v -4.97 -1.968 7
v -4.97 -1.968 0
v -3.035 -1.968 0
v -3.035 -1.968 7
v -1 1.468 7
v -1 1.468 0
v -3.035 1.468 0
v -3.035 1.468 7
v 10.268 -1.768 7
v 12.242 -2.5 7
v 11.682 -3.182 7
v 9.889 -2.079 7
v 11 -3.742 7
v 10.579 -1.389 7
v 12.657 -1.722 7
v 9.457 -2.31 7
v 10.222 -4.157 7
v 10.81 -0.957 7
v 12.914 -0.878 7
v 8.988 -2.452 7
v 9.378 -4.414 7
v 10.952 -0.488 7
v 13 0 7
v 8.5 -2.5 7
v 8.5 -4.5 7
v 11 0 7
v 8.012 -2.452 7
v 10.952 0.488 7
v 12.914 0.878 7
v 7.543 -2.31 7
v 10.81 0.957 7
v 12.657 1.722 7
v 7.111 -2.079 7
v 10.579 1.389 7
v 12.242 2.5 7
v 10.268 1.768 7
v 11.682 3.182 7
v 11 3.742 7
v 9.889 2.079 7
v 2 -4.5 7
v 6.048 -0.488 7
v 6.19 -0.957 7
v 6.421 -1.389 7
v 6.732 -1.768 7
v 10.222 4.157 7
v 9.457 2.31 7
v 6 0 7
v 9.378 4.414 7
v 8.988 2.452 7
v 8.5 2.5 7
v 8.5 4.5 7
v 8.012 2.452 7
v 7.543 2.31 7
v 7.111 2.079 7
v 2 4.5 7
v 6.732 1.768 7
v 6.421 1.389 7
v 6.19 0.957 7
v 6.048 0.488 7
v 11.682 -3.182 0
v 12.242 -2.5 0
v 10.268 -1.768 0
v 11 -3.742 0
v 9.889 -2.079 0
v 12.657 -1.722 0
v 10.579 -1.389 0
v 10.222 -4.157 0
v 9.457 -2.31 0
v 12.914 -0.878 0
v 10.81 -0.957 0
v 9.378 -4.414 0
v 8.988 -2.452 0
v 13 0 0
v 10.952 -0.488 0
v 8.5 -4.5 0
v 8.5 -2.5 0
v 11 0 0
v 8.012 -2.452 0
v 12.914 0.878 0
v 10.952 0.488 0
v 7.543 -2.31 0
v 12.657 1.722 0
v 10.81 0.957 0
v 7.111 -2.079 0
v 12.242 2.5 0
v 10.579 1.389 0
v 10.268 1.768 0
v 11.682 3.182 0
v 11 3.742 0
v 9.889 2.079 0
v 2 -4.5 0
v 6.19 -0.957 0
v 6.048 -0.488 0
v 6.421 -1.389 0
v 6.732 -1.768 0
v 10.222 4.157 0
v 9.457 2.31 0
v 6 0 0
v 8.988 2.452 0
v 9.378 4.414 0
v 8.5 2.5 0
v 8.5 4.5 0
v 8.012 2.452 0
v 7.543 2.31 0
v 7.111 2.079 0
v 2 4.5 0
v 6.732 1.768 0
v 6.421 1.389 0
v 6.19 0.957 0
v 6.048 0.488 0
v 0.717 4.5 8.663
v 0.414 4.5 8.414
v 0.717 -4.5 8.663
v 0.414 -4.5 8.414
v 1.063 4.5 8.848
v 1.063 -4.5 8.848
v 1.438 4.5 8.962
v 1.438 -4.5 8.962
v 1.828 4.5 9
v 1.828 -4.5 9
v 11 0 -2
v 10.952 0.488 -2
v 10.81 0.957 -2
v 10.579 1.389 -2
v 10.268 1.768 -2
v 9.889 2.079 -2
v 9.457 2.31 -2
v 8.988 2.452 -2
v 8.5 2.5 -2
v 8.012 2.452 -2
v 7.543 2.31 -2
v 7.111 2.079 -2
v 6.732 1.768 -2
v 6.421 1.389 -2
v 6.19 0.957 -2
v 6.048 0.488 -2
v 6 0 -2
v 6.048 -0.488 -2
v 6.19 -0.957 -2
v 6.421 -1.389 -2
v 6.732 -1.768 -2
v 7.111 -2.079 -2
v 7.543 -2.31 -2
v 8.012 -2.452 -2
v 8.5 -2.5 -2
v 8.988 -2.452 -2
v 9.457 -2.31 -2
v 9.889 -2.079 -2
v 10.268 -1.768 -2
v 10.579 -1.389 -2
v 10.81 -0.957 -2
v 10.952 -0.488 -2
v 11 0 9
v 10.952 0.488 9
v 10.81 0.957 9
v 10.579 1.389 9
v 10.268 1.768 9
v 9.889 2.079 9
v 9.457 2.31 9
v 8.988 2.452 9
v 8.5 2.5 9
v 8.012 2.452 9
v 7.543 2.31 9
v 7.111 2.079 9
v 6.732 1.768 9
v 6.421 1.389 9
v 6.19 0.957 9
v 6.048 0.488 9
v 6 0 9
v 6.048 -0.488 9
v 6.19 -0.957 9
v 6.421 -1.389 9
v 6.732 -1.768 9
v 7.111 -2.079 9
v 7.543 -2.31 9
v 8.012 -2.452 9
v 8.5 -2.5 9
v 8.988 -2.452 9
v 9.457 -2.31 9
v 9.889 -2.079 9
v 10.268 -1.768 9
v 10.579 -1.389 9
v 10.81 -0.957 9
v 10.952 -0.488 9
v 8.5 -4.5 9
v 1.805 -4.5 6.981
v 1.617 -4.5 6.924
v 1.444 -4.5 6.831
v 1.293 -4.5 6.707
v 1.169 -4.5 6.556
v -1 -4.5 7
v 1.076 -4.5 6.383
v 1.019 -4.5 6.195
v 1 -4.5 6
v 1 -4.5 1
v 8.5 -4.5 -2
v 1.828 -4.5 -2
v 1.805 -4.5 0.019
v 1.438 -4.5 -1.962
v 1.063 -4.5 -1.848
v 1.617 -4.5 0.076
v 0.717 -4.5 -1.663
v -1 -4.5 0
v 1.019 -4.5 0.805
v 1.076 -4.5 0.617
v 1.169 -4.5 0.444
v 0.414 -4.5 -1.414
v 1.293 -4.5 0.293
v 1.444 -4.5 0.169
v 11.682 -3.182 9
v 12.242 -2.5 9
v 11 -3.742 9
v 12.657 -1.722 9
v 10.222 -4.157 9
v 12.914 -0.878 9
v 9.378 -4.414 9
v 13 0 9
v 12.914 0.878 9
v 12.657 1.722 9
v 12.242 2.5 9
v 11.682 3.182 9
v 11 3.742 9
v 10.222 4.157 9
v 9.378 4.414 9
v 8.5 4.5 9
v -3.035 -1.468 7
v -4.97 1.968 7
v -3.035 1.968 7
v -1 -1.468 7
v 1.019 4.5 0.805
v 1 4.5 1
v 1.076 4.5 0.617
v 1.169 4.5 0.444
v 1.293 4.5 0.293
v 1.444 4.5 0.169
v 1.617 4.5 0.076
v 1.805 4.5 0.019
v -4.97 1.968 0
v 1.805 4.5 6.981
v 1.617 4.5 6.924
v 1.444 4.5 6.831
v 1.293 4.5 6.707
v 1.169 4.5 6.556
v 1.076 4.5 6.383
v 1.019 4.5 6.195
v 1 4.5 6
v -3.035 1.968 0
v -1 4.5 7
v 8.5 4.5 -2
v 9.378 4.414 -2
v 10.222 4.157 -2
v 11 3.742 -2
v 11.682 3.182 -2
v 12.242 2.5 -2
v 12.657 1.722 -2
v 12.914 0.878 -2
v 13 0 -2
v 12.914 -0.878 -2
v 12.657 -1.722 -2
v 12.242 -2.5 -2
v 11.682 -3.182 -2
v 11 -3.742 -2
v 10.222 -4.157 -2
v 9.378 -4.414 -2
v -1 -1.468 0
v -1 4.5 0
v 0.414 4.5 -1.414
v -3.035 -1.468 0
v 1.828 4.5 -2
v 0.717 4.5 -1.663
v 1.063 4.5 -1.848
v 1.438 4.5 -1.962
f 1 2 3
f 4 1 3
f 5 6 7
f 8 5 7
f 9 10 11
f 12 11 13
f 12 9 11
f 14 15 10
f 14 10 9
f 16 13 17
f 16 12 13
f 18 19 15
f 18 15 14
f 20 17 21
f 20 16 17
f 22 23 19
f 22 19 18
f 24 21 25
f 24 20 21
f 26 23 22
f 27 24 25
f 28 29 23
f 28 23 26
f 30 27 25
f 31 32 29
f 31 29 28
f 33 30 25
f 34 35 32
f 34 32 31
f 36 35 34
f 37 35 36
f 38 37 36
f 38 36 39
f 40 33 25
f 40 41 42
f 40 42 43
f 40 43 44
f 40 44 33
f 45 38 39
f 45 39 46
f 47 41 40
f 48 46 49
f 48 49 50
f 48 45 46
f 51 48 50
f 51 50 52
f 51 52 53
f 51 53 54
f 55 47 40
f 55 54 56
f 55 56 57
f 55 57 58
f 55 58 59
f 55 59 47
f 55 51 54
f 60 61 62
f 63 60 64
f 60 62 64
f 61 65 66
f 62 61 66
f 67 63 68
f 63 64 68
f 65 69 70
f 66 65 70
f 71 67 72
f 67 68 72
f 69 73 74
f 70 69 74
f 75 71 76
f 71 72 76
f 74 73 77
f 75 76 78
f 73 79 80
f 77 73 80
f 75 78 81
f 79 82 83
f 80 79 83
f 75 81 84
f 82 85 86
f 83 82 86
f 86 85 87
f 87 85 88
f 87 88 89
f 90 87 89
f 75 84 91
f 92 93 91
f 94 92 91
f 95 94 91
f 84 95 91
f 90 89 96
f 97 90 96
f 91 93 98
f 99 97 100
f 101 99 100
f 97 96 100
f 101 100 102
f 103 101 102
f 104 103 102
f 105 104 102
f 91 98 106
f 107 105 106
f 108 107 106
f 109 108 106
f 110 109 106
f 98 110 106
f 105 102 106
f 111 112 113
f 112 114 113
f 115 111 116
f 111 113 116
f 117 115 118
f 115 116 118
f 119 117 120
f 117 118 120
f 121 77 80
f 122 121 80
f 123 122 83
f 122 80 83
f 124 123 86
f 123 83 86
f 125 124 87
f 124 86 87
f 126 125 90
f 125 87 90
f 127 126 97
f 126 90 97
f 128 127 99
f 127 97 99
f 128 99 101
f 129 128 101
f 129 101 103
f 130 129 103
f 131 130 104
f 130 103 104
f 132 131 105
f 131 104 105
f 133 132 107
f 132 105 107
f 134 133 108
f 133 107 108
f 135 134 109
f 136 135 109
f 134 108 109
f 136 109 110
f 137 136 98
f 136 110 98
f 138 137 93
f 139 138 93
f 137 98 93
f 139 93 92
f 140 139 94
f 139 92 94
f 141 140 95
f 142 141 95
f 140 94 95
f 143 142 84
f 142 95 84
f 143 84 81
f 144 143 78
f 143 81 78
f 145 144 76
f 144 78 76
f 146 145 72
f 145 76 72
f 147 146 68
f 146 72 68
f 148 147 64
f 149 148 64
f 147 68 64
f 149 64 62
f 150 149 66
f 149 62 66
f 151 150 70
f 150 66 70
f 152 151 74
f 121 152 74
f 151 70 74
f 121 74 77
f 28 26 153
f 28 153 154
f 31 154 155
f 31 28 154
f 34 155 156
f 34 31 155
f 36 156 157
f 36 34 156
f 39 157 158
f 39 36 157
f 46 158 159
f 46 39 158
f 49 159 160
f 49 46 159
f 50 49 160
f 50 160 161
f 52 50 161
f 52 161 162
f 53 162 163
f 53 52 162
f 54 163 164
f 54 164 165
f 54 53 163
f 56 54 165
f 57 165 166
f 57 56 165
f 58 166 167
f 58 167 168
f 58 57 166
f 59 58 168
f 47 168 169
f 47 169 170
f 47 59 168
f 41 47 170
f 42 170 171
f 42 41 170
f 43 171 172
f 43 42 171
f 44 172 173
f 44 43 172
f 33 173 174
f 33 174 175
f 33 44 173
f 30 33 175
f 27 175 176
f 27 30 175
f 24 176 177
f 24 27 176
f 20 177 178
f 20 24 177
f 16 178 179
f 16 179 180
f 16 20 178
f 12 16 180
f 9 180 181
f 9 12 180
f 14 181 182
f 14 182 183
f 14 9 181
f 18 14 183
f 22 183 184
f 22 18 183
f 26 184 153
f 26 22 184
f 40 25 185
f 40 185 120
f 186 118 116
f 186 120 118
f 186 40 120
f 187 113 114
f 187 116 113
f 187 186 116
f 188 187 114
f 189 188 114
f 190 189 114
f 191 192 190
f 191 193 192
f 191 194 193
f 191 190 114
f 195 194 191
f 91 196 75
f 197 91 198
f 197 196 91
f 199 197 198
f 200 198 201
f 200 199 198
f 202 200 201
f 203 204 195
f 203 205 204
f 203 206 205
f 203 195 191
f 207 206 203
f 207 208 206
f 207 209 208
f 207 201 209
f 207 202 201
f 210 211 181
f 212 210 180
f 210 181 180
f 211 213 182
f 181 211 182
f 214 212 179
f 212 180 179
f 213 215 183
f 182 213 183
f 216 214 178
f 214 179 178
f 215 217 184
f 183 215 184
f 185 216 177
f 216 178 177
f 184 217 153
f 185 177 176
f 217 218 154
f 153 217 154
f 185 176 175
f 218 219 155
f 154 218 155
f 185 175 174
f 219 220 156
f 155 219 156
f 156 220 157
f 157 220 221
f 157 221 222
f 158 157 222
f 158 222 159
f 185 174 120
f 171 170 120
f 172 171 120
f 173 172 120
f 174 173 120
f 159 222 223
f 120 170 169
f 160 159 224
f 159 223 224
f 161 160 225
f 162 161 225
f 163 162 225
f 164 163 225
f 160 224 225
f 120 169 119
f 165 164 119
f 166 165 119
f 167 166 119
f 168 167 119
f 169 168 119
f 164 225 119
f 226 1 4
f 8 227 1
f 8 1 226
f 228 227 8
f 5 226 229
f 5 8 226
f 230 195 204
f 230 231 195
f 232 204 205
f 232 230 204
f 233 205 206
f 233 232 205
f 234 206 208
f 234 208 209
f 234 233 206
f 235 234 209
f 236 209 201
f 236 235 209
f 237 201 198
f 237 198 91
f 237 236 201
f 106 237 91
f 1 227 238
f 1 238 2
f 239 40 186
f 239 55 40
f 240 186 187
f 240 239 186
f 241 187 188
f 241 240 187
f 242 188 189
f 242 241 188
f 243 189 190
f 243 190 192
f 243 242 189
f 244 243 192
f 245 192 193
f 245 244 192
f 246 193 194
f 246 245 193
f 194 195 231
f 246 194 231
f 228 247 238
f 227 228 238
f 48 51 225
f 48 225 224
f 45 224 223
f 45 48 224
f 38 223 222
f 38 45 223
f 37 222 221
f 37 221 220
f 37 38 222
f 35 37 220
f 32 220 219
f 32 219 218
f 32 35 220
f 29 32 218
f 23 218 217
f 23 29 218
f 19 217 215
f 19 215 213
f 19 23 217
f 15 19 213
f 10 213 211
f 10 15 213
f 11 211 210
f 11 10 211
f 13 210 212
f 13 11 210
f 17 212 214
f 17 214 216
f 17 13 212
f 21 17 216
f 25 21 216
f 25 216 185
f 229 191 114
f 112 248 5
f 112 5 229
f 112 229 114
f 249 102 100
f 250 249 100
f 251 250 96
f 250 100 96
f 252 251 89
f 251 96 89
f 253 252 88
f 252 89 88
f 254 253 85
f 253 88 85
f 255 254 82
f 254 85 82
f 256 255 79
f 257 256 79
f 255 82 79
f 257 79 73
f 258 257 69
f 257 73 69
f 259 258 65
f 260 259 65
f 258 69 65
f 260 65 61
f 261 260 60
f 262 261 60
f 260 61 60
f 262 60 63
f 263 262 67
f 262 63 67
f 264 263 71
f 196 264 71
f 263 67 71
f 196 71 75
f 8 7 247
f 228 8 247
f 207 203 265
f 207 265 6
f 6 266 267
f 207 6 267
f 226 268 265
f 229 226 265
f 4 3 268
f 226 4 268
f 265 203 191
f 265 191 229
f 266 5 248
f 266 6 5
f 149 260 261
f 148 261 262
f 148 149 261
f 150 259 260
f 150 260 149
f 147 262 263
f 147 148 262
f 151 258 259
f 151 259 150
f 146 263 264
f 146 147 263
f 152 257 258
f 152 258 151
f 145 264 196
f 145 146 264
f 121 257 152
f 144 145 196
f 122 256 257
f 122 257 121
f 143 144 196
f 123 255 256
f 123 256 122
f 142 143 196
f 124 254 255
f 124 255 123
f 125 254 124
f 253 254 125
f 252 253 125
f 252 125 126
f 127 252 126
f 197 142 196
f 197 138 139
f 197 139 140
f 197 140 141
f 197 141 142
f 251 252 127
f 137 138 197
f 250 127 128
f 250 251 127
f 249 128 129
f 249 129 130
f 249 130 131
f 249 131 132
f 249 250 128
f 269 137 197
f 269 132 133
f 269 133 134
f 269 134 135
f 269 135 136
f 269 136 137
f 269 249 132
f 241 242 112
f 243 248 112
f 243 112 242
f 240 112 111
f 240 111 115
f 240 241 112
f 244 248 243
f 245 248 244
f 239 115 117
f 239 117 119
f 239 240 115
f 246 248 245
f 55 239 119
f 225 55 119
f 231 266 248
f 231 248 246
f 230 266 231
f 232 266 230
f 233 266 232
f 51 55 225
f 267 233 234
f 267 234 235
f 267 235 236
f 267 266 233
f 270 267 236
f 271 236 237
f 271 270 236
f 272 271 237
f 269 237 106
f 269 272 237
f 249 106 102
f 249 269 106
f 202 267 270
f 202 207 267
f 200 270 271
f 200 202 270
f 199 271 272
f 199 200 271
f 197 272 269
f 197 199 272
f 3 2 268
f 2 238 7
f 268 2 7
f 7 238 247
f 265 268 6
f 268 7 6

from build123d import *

# Parameters (mm, degrees)
SKETCH1_W                = 2
SKETCH1_H                = 9
BOSS_EXTRUDE2_DEPTH      = 7
BOSS_EXTRUDE4_DEPTH      = 3.5
BOSS_EXTRUDE4_DEPTH_BACK = 3.5
SKETCH2_R                = 2.5
BOSS_EXTRUDE3_DEPTH      = 2
CUT_EXTRUDE3_DEPTH       = 18.291616466
FILLET1_R                = 1
FILLET2_R                = 2
FILLET2_OF_MIRROR2_R     = 2
FILLET3_R                = 1


with BuildPart() as part:
    # Sketch1 → Boss-Extrude2 (new body)
    with BuildSketch(Plane.XY):
        Rectangle(SKETCH1_W, SKETCH1_H)
    boss_extrude2 = extrude(amount=BOSS_EXTRUDE2_DEPTH)

    # Sketch5 → Boss-Extrude4 (add, two sides: drawn at the far end of the back side and taken through both)
    with BuildSketch(Plane.XY.offset(3.5).offset(-BOSS_EXTRUDE4_DEPTH_BACK)):
        Polygon((-3.035, -1.4675), (-1, -1.4675), (-1, 1.4675), (-3.035, 1.4675), (-3.035, 1.9675), (-4.97, 1.9675), (-4.97, -1.9675), (-3.035, -1.9675), align=None)
    extrude(amount=BOSS_EXTRUDE4_DEPTH + BOSS_EXTRUDE4_DEPTH_BACK)

    # Sketch2 → Boss-Extrude3 (add)
    with BuildSketch(Plane.XY):
        with BuildLine():
            Line((-1, 4.5), (8.5, 4.5))
            ThreePointArc((8.5, 4.5), (13, 0), (8.5, -4.5))
            Line((8.5, -4.5), (-1, -4.5))
            Line((-1, -4.5), (-1, 4.5))
        make_face()
        with Locations((8.5, 0)):
            Circle(SKETCH2_R, mode=Mode.SUBTRACT)
    boss_extrude3 = extrude(amount=-BOSS_EXTRUDE3_DEPTH)

    # Sketch4 → Cut-Extrude3 (cut, through all)
    with BuildSketch(Plane(origin=(0, 4.5, 0), x_dir=(1, 0, 0), z_dir=(0, 1, 0))):
        Polygon((-1, 0), (1, 2), (-1, 2), align=None)
    cut_extrude3 = extrude(amount=-CUT_EXTRUDE3_DEPTH, mode=Mode.SUBTRACT)

    # Fillet1
    fillet1_edges = [part.edges().sort_by_distance(p)[0] for p in [
        (1, 0, 0),
    ]]
    fillet(fillet1_edges, radius=FILLET1_R)

    # Fillet2
    fillet2_edges = [part.edges().sort_by_distance(p)[0] for p in [
        (1, 0, -2),
    ]]
    fillet(fillet2_edges, radius=FILLET2_R)

    # Mirror2: Boss-Extrude2, Boss-Extrude3, Cut-Extrude3 across plane
    add(boss_extrude2.mirror(Plane.XY.offset(3.5)))
    add(boss_extrude3.mirror(Plane.XY.offset(3.5)))
    add(cut_extrude3.mirror(Plane.XY.offset(3.5)), mode=Mode.SUBTRACT)

    # Fillet2 of Mirror2
    fillet2_of_mirror2_edges = [part.edges().sort_by_distance(p)[0] for p in [
        (1, 0, 9),
    ]]
    fillet(fillet2_of_mirror2_edges, radius=FILLET2_OF_MIRROR2_R)

    # Fillet3
    fillet3_edges = [part.edges().sort_by_distance(p)[0] for p in [
        (1, 0, 7),
    ]]
    fillet(fillet3_edges, radius=FILLET3_R)


solid = part.part
